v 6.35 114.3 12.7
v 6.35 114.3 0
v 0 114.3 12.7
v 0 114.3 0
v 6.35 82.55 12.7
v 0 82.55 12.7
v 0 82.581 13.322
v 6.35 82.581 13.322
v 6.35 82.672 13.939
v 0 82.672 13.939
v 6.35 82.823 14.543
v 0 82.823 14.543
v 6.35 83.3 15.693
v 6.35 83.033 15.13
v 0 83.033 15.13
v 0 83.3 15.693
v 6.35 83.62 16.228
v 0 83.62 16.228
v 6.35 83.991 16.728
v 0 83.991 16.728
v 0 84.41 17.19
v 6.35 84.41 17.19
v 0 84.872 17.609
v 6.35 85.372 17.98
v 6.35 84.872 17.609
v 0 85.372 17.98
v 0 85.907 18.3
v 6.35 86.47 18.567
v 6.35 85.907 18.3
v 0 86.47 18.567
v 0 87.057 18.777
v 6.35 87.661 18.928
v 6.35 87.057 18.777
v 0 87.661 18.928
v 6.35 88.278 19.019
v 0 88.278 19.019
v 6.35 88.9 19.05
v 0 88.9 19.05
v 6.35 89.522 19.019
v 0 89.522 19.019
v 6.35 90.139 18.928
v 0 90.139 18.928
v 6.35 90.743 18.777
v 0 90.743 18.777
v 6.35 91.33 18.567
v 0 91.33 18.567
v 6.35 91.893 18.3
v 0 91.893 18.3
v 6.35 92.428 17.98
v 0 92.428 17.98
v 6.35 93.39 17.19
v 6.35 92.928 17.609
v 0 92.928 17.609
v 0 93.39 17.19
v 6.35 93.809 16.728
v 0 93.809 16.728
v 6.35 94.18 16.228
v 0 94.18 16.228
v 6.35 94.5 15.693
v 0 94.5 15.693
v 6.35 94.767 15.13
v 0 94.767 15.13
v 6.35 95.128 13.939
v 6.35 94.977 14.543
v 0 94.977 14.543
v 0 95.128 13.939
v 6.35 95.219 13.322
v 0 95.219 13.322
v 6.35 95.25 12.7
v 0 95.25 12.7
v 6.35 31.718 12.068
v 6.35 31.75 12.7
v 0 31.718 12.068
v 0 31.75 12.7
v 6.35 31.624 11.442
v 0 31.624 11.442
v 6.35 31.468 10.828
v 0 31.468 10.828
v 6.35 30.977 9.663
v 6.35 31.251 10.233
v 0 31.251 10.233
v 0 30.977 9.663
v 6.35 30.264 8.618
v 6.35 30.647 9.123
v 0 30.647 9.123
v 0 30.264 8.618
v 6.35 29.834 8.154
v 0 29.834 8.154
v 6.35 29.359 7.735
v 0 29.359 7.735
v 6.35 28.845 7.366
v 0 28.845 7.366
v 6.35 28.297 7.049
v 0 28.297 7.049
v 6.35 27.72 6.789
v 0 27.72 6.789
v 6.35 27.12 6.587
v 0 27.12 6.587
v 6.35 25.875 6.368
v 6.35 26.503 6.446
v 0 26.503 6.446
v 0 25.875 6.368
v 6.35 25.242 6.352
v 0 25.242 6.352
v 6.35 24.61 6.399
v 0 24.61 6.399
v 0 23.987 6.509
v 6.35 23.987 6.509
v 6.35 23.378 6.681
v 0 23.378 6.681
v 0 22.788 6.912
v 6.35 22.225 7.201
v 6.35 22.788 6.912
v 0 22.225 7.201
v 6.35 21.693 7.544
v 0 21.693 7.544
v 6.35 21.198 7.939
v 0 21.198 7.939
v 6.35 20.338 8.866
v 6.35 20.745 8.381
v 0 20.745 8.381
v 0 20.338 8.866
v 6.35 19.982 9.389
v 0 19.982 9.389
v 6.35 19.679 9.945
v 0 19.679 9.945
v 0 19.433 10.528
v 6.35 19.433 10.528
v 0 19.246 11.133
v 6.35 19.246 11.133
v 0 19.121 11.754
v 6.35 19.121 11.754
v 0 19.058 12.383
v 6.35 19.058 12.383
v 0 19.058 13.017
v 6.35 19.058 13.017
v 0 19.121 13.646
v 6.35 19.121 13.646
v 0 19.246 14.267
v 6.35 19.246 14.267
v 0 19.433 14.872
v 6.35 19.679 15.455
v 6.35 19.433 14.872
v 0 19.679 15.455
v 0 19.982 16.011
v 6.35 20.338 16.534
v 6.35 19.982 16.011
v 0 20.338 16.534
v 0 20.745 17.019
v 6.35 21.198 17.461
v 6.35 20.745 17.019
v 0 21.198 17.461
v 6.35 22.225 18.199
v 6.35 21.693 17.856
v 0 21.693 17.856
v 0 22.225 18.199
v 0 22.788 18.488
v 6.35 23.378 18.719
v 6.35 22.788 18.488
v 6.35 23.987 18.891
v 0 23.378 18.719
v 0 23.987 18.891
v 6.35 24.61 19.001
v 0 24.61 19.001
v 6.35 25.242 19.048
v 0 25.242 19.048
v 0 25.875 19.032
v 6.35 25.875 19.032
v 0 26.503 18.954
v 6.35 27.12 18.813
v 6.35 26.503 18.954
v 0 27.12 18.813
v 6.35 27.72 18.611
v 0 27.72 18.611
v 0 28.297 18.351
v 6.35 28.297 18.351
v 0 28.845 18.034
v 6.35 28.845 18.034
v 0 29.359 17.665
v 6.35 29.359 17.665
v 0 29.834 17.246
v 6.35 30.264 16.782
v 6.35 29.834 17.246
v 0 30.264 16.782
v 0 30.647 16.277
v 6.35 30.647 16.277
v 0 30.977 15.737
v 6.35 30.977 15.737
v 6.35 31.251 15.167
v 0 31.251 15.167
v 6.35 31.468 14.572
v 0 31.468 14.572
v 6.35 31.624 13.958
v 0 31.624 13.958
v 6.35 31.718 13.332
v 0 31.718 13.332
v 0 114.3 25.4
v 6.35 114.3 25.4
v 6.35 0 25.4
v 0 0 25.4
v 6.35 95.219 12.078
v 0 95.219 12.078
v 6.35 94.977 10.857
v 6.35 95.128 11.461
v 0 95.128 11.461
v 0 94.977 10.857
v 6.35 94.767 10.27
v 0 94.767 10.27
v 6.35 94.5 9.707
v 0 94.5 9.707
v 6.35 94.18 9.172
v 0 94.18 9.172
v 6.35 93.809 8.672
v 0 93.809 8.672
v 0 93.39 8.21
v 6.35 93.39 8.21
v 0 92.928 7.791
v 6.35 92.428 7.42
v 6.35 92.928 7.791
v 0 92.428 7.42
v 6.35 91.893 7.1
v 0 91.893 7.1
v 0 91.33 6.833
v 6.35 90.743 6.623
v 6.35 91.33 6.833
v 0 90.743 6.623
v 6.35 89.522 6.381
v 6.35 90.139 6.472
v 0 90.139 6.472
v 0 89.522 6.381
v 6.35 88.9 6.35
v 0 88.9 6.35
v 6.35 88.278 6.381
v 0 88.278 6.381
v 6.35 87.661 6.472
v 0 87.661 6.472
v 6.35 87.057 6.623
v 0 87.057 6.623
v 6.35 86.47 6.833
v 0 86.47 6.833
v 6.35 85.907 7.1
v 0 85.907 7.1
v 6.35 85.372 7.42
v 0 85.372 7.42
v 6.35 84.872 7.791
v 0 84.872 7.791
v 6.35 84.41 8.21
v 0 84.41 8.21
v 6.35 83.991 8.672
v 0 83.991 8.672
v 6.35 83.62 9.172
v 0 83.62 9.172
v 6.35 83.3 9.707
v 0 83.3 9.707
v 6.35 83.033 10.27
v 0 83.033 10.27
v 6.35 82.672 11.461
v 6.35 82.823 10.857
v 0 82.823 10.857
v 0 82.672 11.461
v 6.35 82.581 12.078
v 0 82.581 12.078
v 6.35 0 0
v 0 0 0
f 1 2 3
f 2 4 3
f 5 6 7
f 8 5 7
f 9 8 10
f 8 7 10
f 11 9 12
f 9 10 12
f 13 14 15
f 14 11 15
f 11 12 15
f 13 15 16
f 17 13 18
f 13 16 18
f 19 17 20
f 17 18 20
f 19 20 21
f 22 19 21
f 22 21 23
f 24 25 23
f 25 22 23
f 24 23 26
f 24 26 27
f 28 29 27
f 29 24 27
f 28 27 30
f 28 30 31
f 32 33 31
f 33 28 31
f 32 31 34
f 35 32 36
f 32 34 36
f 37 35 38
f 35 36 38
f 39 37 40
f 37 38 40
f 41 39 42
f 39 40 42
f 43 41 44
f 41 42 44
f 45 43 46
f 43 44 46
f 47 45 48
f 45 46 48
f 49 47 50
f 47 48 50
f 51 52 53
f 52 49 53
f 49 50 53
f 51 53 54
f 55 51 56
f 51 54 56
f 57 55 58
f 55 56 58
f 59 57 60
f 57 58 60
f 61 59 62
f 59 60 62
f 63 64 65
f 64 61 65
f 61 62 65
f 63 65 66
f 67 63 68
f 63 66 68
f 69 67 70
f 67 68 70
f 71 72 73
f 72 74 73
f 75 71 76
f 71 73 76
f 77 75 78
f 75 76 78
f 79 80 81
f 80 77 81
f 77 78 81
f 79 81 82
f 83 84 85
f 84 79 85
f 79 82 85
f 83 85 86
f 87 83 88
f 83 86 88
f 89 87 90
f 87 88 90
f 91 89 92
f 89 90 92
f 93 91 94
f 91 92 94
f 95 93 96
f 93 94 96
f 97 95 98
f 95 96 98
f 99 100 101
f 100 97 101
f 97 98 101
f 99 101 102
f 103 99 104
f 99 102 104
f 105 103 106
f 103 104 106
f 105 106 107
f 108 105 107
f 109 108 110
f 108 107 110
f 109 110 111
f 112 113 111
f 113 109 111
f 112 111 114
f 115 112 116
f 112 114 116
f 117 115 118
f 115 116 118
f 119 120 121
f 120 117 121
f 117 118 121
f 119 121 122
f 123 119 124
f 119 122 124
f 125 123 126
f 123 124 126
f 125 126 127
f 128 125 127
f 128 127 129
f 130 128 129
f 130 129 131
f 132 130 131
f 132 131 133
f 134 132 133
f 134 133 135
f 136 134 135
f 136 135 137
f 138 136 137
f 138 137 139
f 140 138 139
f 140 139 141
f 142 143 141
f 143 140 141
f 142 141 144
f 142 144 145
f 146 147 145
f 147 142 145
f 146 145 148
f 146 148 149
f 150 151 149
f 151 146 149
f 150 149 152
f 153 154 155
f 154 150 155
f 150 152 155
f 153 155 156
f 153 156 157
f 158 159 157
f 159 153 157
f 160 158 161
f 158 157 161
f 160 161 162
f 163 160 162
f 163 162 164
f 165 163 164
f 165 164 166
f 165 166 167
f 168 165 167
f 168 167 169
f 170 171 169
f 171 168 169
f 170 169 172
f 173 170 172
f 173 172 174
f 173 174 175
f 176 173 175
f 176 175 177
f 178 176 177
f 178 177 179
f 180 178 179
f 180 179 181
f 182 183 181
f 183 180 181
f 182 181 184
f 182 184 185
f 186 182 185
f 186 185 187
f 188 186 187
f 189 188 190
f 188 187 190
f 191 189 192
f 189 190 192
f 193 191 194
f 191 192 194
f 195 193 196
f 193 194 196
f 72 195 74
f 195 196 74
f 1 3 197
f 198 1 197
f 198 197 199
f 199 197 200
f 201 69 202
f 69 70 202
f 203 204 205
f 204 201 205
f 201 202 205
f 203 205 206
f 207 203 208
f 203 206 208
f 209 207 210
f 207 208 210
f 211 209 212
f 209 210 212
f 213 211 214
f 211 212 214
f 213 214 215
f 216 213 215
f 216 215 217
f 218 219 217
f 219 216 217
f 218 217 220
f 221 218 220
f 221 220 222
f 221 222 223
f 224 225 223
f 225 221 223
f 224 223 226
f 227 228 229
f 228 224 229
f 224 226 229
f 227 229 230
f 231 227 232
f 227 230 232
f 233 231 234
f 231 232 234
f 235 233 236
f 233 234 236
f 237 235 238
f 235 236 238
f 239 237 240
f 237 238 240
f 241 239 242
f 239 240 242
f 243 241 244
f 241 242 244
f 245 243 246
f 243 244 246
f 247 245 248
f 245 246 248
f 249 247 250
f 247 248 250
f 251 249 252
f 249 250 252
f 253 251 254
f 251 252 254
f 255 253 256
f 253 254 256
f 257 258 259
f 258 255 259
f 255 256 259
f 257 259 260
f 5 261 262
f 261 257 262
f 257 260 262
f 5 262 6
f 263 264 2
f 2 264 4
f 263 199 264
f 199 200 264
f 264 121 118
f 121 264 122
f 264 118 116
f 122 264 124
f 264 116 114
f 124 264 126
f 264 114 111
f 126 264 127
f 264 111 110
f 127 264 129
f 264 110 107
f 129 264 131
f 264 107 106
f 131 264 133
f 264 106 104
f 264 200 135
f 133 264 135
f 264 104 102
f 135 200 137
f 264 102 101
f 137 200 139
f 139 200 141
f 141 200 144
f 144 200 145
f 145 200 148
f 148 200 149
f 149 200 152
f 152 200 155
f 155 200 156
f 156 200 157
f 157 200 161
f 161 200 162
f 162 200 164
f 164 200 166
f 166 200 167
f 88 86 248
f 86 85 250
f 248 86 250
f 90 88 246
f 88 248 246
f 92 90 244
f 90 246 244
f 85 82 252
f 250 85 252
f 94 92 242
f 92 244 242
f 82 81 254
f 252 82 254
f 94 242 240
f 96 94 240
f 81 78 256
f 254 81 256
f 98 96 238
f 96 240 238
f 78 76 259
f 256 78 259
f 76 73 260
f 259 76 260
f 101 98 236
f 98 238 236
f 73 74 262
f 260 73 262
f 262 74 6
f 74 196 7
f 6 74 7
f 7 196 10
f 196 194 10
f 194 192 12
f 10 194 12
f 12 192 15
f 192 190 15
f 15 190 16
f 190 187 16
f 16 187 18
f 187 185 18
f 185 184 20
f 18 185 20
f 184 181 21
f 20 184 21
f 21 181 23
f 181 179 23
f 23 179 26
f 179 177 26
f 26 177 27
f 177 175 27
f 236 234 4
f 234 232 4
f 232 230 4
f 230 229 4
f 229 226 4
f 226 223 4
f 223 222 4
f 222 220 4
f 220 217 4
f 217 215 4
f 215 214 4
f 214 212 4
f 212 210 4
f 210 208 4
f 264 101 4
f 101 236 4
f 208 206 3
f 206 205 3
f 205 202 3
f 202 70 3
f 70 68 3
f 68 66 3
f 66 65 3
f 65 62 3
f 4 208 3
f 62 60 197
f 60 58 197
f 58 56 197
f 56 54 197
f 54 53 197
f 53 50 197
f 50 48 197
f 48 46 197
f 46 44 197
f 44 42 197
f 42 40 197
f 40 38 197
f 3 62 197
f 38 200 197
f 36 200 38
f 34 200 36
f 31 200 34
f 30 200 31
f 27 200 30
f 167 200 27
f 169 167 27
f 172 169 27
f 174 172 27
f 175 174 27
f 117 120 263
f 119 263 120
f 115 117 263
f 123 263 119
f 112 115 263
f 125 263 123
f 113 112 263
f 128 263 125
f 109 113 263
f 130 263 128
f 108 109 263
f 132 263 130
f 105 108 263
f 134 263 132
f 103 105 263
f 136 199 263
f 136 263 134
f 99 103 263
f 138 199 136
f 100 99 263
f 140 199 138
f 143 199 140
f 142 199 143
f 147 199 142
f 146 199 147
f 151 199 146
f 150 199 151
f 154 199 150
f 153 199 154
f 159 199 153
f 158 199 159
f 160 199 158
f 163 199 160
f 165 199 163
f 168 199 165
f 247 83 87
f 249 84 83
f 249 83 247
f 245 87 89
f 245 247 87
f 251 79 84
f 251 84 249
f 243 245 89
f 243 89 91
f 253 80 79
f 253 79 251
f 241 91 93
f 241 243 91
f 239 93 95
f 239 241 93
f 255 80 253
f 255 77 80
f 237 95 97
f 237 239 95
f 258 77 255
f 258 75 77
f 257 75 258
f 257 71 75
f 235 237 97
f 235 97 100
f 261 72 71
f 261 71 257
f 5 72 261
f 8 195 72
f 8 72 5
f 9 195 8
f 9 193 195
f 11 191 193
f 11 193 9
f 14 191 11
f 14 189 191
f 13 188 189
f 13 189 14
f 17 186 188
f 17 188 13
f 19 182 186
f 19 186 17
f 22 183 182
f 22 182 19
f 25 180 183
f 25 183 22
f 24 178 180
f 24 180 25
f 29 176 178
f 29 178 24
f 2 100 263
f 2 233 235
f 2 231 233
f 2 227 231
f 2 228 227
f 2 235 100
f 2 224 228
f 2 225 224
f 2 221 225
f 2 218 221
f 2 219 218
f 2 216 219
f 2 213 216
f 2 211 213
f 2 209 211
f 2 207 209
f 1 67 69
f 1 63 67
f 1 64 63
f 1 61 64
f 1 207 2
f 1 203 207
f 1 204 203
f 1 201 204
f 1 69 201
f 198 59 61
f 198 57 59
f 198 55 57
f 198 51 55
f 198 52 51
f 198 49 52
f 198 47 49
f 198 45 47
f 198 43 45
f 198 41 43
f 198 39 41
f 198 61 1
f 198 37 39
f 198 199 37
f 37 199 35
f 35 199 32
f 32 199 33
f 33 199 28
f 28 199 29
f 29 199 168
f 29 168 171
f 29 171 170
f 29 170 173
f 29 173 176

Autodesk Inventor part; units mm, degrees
ref_plane "YZ Plane" through (0, 0, 0) normal (1, 0, 0) x (0, 1, 0)
ref_plane "XZ Plane" through (0, 0, 0) normal (0, 1, 0) x (-1, 0, 0)
ref_plane "XY Plane" through (0, 0, 0) normal (0, 0, 1) x (1, 0, 0)
sketch "Sketch1" plane through (0, 0, 0) normal (1, 0, 0) x (0, 1, 0)
  line L0 (0, 0) -> (114.3, 0)
  line L1 (114.3, 0) -> (114.3, 25.4)
  line L2 (114.3, 25.4) -> (0, 25.4)
  line L3 (0, 25.4) -> (0, 0)
  line L4 (114.3, 12.7) -> (88.9, 12.7)
  line L5 (88.9, 12.7) -> (25.4, 12.7)
  circle A0 centre (25.4, 12.7) radius 6.35
  circle A1 centre (88.9, 12.7) radius 6.35
  dimension "d0" = 114.3
  dimension "d1" = 25.4
  dimension "d4" = 25.4
  dimension "d5" = 63.5
  dimension "d6" = 12.7
  dimension "d7" = 12.7
extrude "Extrusion2" add sketch "Sketch1" along normal blind 6.35
properties part number "CatapultArmSquare-Thickener"
